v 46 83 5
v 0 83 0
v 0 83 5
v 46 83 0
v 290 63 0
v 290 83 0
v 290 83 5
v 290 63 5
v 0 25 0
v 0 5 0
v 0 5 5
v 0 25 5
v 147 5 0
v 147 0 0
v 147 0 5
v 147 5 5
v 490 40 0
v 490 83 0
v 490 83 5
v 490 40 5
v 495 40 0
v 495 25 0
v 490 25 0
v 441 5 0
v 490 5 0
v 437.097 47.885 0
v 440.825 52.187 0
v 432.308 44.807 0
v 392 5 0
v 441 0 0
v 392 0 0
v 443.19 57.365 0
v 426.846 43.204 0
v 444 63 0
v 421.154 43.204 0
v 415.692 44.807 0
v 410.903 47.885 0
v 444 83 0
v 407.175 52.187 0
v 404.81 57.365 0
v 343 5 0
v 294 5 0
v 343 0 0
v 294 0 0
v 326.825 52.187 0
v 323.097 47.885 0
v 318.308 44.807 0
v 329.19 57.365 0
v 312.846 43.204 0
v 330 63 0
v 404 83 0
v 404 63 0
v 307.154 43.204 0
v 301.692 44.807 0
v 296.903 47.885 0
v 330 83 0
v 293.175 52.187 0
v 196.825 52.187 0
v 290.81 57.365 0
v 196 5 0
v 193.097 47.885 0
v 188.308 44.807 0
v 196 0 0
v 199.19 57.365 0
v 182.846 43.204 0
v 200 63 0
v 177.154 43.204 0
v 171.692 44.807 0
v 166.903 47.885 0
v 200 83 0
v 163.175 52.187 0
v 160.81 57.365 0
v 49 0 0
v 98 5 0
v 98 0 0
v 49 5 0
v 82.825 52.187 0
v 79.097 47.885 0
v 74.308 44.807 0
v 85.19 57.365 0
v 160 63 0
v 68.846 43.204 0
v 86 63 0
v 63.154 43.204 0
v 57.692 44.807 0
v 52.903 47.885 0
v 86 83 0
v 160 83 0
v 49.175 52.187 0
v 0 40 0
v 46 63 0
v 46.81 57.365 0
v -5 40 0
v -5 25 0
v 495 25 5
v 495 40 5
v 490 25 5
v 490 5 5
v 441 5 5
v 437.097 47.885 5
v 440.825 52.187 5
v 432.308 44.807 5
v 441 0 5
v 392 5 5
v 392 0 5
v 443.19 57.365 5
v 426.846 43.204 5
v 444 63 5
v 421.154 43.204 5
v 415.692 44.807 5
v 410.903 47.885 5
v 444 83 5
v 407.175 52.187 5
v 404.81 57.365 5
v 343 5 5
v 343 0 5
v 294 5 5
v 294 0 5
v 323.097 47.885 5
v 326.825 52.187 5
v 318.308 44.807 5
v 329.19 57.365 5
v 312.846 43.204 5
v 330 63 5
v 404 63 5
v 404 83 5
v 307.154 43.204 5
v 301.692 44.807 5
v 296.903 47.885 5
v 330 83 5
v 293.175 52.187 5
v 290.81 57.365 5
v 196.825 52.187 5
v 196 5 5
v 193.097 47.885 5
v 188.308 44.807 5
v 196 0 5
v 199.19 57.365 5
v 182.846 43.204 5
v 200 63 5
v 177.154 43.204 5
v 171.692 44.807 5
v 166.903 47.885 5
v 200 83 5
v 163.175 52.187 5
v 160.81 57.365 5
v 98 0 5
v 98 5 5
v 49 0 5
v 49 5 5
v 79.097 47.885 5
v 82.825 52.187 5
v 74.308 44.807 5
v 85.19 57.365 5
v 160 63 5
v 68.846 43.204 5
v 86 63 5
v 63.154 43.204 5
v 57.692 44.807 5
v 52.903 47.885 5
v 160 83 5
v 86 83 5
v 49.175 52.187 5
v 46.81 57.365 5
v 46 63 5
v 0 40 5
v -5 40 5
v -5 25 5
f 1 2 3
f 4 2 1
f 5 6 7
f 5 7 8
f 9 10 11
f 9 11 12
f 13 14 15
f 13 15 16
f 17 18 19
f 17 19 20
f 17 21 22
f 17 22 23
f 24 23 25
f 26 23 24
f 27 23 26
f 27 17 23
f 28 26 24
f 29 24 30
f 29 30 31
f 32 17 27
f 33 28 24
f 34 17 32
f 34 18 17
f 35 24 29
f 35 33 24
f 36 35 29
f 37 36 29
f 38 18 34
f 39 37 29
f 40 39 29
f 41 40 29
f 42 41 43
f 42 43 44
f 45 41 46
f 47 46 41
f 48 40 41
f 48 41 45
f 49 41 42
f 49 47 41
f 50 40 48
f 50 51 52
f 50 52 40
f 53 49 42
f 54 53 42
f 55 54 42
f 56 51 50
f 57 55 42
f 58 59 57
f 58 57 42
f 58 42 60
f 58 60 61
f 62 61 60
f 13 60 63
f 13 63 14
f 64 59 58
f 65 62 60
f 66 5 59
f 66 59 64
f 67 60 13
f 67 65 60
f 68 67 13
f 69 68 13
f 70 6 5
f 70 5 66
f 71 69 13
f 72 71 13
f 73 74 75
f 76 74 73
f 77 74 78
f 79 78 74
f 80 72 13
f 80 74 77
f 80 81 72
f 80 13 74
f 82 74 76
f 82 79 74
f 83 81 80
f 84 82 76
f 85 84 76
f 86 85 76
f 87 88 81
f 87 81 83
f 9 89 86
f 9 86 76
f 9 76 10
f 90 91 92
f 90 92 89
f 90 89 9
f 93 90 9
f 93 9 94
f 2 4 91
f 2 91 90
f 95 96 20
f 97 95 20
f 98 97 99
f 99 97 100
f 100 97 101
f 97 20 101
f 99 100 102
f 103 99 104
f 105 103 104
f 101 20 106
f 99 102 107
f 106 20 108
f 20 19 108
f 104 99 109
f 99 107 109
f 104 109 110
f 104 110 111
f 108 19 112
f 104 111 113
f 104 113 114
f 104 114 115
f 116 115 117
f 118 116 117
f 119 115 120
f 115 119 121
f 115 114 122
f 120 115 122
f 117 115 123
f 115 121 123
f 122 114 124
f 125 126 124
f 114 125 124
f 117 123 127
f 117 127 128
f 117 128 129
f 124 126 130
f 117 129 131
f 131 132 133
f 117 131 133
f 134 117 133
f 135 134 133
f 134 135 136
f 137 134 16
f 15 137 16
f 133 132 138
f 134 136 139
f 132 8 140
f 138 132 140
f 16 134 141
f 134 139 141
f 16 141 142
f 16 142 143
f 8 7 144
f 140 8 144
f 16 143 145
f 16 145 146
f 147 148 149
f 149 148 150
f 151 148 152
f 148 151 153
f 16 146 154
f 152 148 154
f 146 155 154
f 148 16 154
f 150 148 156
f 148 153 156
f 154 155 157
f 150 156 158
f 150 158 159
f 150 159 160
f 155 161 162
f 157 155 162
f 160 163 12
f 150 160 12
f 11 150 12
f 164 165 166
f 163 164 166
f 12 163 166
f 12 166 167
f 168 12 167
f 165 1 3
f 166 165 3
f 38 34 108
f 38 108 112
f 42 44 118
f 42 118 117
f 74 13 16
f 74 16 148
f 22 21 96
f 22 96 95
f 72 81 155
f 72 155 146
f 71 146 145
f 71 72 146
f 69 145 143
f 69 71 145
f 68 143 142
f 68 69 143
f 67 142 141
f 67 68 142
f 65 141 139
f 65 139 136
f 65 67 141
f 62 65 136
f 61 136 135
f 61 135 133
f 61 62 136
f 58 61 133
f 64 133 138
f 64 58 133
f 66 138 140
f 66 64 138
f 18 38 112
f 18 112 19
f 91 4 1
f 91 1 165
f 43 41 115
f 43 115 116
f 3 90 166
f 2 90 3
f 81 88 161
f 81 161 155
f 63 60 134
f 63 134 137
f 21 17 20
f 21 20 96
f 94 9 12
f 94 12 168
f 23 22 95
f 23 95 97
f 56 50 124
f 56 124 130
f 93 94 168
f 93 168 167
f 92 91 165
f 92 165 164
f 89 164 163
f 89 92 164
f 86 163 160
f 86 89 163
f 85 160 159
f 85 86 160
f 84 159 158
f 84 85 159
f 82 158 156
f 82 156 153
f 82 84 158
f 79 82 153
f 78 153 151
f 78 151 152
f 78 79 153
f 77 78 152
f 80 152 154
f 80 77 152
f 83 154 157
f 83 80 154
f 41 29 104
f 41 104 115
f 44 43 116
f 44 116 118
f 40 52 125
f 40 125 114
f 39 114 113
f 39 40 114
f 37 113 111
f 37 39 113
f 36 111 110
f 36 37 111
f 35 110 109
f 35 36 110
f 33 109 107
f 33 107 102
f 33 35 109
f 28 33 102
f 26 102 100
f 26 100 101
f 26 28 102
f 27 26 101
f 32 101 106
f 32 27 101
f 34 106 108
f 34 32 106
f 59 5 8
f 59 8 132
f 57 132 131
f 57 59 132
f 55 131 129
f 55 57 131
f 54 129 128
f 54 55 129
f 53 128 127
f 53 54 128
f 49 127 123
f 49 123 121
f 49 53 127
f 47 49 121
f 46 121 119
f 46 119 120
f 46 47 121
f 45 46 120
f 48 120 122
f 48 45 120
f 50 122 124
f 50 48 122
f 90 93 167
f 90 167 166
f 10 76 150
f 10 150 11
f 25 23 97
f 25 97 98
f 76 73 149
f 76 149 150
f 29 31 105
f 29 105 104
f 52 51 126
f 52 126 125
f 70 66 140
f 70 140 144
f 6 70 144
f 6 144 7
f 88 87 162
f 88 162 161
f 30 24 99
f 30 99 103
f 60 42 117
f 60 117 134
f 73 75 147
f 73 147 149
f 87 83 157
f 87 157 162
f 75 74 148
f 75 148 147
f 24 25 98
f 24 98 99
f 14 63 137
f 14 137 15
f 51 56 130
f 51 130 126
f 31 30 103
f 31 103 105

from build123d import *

# Parameters (mm, degrees)
BOSS_EXTRU_1_DEPTH = 5


with BuildPart() as part:
    # Esquisse1 → Boss.-Extru.1 (new body)
    with BuildSketch(Plane.XY):
        with BuildLine():
            Line((0, 40), (0, 83))
            Line((0, 83), (46, 83))
            Line((46, 83), (46, 63))
            ThreePointArc((46, 63), (66, 43), (86, 63))
            Line((86, 63), (86, 83))
            Line((86, 83), (160, 83))
            Line((160, 83), (160, 63))
            ThreePointArc((160, 63), (180, 43), (200, 63))
            Line((200, 63), (200, 83))
            Line((200, 83), (290, 83))
            Line((290, 83), (290, 63))
            ThreePointArc((290, 63), (310, 43), (330, 63))
            Line((330, 63), (330, 83))
            Line((330, 83), (404, 83))
            Line((404, 83), (404, 63))
            ThreePointArc((404, 63), (424, 43), (444, 63))
            Line((444, 63), (444, 83))
            Line((444, 83), (490, 83))
            Line((490, 83), (490, 40))
            Line((490, 40), (495, 40))
            Line((495, 40), (495, 25))
            Line((495, 25), (490, 25))
            Line((490, 25), (490, 5))
            Line((490, 5), (441, 5))
            Line((441, 5), (441, 0))
            Line((441, 0), (392, 0))
            Line((392, 0), (392, 5))
            Line((392, 5), (343, 5))
            Line((343, 5), (343, 0))
            Line((343, 0), (294, 0))
            Line((294, 0), (294, 5))
            Line((294, 5), (245, 5))
            Line((245, 5), (196, 5))
            Line((196, 5), (196, 0))
            Line((196, 0), (147, 0))
            Line((147, 0), (147, 5))
            Line((147, 5), (98, 5))
            Line((98, 5), (98, 0))
            Line((98, 0), (49, 0))
            Line((49, 0), (49, 5))
            Line((49, 5), (0, 5))
            Line((0, 5), (0, 25))
            Line((0, 25), (-5, 25))
            Line((-5, 25), (-5, 40))
            Line((-5, 40), (0, 40))
        make_face()
    extrude(amount=BOSS_EXTRU_1_DEPTH)


solid = part.part
